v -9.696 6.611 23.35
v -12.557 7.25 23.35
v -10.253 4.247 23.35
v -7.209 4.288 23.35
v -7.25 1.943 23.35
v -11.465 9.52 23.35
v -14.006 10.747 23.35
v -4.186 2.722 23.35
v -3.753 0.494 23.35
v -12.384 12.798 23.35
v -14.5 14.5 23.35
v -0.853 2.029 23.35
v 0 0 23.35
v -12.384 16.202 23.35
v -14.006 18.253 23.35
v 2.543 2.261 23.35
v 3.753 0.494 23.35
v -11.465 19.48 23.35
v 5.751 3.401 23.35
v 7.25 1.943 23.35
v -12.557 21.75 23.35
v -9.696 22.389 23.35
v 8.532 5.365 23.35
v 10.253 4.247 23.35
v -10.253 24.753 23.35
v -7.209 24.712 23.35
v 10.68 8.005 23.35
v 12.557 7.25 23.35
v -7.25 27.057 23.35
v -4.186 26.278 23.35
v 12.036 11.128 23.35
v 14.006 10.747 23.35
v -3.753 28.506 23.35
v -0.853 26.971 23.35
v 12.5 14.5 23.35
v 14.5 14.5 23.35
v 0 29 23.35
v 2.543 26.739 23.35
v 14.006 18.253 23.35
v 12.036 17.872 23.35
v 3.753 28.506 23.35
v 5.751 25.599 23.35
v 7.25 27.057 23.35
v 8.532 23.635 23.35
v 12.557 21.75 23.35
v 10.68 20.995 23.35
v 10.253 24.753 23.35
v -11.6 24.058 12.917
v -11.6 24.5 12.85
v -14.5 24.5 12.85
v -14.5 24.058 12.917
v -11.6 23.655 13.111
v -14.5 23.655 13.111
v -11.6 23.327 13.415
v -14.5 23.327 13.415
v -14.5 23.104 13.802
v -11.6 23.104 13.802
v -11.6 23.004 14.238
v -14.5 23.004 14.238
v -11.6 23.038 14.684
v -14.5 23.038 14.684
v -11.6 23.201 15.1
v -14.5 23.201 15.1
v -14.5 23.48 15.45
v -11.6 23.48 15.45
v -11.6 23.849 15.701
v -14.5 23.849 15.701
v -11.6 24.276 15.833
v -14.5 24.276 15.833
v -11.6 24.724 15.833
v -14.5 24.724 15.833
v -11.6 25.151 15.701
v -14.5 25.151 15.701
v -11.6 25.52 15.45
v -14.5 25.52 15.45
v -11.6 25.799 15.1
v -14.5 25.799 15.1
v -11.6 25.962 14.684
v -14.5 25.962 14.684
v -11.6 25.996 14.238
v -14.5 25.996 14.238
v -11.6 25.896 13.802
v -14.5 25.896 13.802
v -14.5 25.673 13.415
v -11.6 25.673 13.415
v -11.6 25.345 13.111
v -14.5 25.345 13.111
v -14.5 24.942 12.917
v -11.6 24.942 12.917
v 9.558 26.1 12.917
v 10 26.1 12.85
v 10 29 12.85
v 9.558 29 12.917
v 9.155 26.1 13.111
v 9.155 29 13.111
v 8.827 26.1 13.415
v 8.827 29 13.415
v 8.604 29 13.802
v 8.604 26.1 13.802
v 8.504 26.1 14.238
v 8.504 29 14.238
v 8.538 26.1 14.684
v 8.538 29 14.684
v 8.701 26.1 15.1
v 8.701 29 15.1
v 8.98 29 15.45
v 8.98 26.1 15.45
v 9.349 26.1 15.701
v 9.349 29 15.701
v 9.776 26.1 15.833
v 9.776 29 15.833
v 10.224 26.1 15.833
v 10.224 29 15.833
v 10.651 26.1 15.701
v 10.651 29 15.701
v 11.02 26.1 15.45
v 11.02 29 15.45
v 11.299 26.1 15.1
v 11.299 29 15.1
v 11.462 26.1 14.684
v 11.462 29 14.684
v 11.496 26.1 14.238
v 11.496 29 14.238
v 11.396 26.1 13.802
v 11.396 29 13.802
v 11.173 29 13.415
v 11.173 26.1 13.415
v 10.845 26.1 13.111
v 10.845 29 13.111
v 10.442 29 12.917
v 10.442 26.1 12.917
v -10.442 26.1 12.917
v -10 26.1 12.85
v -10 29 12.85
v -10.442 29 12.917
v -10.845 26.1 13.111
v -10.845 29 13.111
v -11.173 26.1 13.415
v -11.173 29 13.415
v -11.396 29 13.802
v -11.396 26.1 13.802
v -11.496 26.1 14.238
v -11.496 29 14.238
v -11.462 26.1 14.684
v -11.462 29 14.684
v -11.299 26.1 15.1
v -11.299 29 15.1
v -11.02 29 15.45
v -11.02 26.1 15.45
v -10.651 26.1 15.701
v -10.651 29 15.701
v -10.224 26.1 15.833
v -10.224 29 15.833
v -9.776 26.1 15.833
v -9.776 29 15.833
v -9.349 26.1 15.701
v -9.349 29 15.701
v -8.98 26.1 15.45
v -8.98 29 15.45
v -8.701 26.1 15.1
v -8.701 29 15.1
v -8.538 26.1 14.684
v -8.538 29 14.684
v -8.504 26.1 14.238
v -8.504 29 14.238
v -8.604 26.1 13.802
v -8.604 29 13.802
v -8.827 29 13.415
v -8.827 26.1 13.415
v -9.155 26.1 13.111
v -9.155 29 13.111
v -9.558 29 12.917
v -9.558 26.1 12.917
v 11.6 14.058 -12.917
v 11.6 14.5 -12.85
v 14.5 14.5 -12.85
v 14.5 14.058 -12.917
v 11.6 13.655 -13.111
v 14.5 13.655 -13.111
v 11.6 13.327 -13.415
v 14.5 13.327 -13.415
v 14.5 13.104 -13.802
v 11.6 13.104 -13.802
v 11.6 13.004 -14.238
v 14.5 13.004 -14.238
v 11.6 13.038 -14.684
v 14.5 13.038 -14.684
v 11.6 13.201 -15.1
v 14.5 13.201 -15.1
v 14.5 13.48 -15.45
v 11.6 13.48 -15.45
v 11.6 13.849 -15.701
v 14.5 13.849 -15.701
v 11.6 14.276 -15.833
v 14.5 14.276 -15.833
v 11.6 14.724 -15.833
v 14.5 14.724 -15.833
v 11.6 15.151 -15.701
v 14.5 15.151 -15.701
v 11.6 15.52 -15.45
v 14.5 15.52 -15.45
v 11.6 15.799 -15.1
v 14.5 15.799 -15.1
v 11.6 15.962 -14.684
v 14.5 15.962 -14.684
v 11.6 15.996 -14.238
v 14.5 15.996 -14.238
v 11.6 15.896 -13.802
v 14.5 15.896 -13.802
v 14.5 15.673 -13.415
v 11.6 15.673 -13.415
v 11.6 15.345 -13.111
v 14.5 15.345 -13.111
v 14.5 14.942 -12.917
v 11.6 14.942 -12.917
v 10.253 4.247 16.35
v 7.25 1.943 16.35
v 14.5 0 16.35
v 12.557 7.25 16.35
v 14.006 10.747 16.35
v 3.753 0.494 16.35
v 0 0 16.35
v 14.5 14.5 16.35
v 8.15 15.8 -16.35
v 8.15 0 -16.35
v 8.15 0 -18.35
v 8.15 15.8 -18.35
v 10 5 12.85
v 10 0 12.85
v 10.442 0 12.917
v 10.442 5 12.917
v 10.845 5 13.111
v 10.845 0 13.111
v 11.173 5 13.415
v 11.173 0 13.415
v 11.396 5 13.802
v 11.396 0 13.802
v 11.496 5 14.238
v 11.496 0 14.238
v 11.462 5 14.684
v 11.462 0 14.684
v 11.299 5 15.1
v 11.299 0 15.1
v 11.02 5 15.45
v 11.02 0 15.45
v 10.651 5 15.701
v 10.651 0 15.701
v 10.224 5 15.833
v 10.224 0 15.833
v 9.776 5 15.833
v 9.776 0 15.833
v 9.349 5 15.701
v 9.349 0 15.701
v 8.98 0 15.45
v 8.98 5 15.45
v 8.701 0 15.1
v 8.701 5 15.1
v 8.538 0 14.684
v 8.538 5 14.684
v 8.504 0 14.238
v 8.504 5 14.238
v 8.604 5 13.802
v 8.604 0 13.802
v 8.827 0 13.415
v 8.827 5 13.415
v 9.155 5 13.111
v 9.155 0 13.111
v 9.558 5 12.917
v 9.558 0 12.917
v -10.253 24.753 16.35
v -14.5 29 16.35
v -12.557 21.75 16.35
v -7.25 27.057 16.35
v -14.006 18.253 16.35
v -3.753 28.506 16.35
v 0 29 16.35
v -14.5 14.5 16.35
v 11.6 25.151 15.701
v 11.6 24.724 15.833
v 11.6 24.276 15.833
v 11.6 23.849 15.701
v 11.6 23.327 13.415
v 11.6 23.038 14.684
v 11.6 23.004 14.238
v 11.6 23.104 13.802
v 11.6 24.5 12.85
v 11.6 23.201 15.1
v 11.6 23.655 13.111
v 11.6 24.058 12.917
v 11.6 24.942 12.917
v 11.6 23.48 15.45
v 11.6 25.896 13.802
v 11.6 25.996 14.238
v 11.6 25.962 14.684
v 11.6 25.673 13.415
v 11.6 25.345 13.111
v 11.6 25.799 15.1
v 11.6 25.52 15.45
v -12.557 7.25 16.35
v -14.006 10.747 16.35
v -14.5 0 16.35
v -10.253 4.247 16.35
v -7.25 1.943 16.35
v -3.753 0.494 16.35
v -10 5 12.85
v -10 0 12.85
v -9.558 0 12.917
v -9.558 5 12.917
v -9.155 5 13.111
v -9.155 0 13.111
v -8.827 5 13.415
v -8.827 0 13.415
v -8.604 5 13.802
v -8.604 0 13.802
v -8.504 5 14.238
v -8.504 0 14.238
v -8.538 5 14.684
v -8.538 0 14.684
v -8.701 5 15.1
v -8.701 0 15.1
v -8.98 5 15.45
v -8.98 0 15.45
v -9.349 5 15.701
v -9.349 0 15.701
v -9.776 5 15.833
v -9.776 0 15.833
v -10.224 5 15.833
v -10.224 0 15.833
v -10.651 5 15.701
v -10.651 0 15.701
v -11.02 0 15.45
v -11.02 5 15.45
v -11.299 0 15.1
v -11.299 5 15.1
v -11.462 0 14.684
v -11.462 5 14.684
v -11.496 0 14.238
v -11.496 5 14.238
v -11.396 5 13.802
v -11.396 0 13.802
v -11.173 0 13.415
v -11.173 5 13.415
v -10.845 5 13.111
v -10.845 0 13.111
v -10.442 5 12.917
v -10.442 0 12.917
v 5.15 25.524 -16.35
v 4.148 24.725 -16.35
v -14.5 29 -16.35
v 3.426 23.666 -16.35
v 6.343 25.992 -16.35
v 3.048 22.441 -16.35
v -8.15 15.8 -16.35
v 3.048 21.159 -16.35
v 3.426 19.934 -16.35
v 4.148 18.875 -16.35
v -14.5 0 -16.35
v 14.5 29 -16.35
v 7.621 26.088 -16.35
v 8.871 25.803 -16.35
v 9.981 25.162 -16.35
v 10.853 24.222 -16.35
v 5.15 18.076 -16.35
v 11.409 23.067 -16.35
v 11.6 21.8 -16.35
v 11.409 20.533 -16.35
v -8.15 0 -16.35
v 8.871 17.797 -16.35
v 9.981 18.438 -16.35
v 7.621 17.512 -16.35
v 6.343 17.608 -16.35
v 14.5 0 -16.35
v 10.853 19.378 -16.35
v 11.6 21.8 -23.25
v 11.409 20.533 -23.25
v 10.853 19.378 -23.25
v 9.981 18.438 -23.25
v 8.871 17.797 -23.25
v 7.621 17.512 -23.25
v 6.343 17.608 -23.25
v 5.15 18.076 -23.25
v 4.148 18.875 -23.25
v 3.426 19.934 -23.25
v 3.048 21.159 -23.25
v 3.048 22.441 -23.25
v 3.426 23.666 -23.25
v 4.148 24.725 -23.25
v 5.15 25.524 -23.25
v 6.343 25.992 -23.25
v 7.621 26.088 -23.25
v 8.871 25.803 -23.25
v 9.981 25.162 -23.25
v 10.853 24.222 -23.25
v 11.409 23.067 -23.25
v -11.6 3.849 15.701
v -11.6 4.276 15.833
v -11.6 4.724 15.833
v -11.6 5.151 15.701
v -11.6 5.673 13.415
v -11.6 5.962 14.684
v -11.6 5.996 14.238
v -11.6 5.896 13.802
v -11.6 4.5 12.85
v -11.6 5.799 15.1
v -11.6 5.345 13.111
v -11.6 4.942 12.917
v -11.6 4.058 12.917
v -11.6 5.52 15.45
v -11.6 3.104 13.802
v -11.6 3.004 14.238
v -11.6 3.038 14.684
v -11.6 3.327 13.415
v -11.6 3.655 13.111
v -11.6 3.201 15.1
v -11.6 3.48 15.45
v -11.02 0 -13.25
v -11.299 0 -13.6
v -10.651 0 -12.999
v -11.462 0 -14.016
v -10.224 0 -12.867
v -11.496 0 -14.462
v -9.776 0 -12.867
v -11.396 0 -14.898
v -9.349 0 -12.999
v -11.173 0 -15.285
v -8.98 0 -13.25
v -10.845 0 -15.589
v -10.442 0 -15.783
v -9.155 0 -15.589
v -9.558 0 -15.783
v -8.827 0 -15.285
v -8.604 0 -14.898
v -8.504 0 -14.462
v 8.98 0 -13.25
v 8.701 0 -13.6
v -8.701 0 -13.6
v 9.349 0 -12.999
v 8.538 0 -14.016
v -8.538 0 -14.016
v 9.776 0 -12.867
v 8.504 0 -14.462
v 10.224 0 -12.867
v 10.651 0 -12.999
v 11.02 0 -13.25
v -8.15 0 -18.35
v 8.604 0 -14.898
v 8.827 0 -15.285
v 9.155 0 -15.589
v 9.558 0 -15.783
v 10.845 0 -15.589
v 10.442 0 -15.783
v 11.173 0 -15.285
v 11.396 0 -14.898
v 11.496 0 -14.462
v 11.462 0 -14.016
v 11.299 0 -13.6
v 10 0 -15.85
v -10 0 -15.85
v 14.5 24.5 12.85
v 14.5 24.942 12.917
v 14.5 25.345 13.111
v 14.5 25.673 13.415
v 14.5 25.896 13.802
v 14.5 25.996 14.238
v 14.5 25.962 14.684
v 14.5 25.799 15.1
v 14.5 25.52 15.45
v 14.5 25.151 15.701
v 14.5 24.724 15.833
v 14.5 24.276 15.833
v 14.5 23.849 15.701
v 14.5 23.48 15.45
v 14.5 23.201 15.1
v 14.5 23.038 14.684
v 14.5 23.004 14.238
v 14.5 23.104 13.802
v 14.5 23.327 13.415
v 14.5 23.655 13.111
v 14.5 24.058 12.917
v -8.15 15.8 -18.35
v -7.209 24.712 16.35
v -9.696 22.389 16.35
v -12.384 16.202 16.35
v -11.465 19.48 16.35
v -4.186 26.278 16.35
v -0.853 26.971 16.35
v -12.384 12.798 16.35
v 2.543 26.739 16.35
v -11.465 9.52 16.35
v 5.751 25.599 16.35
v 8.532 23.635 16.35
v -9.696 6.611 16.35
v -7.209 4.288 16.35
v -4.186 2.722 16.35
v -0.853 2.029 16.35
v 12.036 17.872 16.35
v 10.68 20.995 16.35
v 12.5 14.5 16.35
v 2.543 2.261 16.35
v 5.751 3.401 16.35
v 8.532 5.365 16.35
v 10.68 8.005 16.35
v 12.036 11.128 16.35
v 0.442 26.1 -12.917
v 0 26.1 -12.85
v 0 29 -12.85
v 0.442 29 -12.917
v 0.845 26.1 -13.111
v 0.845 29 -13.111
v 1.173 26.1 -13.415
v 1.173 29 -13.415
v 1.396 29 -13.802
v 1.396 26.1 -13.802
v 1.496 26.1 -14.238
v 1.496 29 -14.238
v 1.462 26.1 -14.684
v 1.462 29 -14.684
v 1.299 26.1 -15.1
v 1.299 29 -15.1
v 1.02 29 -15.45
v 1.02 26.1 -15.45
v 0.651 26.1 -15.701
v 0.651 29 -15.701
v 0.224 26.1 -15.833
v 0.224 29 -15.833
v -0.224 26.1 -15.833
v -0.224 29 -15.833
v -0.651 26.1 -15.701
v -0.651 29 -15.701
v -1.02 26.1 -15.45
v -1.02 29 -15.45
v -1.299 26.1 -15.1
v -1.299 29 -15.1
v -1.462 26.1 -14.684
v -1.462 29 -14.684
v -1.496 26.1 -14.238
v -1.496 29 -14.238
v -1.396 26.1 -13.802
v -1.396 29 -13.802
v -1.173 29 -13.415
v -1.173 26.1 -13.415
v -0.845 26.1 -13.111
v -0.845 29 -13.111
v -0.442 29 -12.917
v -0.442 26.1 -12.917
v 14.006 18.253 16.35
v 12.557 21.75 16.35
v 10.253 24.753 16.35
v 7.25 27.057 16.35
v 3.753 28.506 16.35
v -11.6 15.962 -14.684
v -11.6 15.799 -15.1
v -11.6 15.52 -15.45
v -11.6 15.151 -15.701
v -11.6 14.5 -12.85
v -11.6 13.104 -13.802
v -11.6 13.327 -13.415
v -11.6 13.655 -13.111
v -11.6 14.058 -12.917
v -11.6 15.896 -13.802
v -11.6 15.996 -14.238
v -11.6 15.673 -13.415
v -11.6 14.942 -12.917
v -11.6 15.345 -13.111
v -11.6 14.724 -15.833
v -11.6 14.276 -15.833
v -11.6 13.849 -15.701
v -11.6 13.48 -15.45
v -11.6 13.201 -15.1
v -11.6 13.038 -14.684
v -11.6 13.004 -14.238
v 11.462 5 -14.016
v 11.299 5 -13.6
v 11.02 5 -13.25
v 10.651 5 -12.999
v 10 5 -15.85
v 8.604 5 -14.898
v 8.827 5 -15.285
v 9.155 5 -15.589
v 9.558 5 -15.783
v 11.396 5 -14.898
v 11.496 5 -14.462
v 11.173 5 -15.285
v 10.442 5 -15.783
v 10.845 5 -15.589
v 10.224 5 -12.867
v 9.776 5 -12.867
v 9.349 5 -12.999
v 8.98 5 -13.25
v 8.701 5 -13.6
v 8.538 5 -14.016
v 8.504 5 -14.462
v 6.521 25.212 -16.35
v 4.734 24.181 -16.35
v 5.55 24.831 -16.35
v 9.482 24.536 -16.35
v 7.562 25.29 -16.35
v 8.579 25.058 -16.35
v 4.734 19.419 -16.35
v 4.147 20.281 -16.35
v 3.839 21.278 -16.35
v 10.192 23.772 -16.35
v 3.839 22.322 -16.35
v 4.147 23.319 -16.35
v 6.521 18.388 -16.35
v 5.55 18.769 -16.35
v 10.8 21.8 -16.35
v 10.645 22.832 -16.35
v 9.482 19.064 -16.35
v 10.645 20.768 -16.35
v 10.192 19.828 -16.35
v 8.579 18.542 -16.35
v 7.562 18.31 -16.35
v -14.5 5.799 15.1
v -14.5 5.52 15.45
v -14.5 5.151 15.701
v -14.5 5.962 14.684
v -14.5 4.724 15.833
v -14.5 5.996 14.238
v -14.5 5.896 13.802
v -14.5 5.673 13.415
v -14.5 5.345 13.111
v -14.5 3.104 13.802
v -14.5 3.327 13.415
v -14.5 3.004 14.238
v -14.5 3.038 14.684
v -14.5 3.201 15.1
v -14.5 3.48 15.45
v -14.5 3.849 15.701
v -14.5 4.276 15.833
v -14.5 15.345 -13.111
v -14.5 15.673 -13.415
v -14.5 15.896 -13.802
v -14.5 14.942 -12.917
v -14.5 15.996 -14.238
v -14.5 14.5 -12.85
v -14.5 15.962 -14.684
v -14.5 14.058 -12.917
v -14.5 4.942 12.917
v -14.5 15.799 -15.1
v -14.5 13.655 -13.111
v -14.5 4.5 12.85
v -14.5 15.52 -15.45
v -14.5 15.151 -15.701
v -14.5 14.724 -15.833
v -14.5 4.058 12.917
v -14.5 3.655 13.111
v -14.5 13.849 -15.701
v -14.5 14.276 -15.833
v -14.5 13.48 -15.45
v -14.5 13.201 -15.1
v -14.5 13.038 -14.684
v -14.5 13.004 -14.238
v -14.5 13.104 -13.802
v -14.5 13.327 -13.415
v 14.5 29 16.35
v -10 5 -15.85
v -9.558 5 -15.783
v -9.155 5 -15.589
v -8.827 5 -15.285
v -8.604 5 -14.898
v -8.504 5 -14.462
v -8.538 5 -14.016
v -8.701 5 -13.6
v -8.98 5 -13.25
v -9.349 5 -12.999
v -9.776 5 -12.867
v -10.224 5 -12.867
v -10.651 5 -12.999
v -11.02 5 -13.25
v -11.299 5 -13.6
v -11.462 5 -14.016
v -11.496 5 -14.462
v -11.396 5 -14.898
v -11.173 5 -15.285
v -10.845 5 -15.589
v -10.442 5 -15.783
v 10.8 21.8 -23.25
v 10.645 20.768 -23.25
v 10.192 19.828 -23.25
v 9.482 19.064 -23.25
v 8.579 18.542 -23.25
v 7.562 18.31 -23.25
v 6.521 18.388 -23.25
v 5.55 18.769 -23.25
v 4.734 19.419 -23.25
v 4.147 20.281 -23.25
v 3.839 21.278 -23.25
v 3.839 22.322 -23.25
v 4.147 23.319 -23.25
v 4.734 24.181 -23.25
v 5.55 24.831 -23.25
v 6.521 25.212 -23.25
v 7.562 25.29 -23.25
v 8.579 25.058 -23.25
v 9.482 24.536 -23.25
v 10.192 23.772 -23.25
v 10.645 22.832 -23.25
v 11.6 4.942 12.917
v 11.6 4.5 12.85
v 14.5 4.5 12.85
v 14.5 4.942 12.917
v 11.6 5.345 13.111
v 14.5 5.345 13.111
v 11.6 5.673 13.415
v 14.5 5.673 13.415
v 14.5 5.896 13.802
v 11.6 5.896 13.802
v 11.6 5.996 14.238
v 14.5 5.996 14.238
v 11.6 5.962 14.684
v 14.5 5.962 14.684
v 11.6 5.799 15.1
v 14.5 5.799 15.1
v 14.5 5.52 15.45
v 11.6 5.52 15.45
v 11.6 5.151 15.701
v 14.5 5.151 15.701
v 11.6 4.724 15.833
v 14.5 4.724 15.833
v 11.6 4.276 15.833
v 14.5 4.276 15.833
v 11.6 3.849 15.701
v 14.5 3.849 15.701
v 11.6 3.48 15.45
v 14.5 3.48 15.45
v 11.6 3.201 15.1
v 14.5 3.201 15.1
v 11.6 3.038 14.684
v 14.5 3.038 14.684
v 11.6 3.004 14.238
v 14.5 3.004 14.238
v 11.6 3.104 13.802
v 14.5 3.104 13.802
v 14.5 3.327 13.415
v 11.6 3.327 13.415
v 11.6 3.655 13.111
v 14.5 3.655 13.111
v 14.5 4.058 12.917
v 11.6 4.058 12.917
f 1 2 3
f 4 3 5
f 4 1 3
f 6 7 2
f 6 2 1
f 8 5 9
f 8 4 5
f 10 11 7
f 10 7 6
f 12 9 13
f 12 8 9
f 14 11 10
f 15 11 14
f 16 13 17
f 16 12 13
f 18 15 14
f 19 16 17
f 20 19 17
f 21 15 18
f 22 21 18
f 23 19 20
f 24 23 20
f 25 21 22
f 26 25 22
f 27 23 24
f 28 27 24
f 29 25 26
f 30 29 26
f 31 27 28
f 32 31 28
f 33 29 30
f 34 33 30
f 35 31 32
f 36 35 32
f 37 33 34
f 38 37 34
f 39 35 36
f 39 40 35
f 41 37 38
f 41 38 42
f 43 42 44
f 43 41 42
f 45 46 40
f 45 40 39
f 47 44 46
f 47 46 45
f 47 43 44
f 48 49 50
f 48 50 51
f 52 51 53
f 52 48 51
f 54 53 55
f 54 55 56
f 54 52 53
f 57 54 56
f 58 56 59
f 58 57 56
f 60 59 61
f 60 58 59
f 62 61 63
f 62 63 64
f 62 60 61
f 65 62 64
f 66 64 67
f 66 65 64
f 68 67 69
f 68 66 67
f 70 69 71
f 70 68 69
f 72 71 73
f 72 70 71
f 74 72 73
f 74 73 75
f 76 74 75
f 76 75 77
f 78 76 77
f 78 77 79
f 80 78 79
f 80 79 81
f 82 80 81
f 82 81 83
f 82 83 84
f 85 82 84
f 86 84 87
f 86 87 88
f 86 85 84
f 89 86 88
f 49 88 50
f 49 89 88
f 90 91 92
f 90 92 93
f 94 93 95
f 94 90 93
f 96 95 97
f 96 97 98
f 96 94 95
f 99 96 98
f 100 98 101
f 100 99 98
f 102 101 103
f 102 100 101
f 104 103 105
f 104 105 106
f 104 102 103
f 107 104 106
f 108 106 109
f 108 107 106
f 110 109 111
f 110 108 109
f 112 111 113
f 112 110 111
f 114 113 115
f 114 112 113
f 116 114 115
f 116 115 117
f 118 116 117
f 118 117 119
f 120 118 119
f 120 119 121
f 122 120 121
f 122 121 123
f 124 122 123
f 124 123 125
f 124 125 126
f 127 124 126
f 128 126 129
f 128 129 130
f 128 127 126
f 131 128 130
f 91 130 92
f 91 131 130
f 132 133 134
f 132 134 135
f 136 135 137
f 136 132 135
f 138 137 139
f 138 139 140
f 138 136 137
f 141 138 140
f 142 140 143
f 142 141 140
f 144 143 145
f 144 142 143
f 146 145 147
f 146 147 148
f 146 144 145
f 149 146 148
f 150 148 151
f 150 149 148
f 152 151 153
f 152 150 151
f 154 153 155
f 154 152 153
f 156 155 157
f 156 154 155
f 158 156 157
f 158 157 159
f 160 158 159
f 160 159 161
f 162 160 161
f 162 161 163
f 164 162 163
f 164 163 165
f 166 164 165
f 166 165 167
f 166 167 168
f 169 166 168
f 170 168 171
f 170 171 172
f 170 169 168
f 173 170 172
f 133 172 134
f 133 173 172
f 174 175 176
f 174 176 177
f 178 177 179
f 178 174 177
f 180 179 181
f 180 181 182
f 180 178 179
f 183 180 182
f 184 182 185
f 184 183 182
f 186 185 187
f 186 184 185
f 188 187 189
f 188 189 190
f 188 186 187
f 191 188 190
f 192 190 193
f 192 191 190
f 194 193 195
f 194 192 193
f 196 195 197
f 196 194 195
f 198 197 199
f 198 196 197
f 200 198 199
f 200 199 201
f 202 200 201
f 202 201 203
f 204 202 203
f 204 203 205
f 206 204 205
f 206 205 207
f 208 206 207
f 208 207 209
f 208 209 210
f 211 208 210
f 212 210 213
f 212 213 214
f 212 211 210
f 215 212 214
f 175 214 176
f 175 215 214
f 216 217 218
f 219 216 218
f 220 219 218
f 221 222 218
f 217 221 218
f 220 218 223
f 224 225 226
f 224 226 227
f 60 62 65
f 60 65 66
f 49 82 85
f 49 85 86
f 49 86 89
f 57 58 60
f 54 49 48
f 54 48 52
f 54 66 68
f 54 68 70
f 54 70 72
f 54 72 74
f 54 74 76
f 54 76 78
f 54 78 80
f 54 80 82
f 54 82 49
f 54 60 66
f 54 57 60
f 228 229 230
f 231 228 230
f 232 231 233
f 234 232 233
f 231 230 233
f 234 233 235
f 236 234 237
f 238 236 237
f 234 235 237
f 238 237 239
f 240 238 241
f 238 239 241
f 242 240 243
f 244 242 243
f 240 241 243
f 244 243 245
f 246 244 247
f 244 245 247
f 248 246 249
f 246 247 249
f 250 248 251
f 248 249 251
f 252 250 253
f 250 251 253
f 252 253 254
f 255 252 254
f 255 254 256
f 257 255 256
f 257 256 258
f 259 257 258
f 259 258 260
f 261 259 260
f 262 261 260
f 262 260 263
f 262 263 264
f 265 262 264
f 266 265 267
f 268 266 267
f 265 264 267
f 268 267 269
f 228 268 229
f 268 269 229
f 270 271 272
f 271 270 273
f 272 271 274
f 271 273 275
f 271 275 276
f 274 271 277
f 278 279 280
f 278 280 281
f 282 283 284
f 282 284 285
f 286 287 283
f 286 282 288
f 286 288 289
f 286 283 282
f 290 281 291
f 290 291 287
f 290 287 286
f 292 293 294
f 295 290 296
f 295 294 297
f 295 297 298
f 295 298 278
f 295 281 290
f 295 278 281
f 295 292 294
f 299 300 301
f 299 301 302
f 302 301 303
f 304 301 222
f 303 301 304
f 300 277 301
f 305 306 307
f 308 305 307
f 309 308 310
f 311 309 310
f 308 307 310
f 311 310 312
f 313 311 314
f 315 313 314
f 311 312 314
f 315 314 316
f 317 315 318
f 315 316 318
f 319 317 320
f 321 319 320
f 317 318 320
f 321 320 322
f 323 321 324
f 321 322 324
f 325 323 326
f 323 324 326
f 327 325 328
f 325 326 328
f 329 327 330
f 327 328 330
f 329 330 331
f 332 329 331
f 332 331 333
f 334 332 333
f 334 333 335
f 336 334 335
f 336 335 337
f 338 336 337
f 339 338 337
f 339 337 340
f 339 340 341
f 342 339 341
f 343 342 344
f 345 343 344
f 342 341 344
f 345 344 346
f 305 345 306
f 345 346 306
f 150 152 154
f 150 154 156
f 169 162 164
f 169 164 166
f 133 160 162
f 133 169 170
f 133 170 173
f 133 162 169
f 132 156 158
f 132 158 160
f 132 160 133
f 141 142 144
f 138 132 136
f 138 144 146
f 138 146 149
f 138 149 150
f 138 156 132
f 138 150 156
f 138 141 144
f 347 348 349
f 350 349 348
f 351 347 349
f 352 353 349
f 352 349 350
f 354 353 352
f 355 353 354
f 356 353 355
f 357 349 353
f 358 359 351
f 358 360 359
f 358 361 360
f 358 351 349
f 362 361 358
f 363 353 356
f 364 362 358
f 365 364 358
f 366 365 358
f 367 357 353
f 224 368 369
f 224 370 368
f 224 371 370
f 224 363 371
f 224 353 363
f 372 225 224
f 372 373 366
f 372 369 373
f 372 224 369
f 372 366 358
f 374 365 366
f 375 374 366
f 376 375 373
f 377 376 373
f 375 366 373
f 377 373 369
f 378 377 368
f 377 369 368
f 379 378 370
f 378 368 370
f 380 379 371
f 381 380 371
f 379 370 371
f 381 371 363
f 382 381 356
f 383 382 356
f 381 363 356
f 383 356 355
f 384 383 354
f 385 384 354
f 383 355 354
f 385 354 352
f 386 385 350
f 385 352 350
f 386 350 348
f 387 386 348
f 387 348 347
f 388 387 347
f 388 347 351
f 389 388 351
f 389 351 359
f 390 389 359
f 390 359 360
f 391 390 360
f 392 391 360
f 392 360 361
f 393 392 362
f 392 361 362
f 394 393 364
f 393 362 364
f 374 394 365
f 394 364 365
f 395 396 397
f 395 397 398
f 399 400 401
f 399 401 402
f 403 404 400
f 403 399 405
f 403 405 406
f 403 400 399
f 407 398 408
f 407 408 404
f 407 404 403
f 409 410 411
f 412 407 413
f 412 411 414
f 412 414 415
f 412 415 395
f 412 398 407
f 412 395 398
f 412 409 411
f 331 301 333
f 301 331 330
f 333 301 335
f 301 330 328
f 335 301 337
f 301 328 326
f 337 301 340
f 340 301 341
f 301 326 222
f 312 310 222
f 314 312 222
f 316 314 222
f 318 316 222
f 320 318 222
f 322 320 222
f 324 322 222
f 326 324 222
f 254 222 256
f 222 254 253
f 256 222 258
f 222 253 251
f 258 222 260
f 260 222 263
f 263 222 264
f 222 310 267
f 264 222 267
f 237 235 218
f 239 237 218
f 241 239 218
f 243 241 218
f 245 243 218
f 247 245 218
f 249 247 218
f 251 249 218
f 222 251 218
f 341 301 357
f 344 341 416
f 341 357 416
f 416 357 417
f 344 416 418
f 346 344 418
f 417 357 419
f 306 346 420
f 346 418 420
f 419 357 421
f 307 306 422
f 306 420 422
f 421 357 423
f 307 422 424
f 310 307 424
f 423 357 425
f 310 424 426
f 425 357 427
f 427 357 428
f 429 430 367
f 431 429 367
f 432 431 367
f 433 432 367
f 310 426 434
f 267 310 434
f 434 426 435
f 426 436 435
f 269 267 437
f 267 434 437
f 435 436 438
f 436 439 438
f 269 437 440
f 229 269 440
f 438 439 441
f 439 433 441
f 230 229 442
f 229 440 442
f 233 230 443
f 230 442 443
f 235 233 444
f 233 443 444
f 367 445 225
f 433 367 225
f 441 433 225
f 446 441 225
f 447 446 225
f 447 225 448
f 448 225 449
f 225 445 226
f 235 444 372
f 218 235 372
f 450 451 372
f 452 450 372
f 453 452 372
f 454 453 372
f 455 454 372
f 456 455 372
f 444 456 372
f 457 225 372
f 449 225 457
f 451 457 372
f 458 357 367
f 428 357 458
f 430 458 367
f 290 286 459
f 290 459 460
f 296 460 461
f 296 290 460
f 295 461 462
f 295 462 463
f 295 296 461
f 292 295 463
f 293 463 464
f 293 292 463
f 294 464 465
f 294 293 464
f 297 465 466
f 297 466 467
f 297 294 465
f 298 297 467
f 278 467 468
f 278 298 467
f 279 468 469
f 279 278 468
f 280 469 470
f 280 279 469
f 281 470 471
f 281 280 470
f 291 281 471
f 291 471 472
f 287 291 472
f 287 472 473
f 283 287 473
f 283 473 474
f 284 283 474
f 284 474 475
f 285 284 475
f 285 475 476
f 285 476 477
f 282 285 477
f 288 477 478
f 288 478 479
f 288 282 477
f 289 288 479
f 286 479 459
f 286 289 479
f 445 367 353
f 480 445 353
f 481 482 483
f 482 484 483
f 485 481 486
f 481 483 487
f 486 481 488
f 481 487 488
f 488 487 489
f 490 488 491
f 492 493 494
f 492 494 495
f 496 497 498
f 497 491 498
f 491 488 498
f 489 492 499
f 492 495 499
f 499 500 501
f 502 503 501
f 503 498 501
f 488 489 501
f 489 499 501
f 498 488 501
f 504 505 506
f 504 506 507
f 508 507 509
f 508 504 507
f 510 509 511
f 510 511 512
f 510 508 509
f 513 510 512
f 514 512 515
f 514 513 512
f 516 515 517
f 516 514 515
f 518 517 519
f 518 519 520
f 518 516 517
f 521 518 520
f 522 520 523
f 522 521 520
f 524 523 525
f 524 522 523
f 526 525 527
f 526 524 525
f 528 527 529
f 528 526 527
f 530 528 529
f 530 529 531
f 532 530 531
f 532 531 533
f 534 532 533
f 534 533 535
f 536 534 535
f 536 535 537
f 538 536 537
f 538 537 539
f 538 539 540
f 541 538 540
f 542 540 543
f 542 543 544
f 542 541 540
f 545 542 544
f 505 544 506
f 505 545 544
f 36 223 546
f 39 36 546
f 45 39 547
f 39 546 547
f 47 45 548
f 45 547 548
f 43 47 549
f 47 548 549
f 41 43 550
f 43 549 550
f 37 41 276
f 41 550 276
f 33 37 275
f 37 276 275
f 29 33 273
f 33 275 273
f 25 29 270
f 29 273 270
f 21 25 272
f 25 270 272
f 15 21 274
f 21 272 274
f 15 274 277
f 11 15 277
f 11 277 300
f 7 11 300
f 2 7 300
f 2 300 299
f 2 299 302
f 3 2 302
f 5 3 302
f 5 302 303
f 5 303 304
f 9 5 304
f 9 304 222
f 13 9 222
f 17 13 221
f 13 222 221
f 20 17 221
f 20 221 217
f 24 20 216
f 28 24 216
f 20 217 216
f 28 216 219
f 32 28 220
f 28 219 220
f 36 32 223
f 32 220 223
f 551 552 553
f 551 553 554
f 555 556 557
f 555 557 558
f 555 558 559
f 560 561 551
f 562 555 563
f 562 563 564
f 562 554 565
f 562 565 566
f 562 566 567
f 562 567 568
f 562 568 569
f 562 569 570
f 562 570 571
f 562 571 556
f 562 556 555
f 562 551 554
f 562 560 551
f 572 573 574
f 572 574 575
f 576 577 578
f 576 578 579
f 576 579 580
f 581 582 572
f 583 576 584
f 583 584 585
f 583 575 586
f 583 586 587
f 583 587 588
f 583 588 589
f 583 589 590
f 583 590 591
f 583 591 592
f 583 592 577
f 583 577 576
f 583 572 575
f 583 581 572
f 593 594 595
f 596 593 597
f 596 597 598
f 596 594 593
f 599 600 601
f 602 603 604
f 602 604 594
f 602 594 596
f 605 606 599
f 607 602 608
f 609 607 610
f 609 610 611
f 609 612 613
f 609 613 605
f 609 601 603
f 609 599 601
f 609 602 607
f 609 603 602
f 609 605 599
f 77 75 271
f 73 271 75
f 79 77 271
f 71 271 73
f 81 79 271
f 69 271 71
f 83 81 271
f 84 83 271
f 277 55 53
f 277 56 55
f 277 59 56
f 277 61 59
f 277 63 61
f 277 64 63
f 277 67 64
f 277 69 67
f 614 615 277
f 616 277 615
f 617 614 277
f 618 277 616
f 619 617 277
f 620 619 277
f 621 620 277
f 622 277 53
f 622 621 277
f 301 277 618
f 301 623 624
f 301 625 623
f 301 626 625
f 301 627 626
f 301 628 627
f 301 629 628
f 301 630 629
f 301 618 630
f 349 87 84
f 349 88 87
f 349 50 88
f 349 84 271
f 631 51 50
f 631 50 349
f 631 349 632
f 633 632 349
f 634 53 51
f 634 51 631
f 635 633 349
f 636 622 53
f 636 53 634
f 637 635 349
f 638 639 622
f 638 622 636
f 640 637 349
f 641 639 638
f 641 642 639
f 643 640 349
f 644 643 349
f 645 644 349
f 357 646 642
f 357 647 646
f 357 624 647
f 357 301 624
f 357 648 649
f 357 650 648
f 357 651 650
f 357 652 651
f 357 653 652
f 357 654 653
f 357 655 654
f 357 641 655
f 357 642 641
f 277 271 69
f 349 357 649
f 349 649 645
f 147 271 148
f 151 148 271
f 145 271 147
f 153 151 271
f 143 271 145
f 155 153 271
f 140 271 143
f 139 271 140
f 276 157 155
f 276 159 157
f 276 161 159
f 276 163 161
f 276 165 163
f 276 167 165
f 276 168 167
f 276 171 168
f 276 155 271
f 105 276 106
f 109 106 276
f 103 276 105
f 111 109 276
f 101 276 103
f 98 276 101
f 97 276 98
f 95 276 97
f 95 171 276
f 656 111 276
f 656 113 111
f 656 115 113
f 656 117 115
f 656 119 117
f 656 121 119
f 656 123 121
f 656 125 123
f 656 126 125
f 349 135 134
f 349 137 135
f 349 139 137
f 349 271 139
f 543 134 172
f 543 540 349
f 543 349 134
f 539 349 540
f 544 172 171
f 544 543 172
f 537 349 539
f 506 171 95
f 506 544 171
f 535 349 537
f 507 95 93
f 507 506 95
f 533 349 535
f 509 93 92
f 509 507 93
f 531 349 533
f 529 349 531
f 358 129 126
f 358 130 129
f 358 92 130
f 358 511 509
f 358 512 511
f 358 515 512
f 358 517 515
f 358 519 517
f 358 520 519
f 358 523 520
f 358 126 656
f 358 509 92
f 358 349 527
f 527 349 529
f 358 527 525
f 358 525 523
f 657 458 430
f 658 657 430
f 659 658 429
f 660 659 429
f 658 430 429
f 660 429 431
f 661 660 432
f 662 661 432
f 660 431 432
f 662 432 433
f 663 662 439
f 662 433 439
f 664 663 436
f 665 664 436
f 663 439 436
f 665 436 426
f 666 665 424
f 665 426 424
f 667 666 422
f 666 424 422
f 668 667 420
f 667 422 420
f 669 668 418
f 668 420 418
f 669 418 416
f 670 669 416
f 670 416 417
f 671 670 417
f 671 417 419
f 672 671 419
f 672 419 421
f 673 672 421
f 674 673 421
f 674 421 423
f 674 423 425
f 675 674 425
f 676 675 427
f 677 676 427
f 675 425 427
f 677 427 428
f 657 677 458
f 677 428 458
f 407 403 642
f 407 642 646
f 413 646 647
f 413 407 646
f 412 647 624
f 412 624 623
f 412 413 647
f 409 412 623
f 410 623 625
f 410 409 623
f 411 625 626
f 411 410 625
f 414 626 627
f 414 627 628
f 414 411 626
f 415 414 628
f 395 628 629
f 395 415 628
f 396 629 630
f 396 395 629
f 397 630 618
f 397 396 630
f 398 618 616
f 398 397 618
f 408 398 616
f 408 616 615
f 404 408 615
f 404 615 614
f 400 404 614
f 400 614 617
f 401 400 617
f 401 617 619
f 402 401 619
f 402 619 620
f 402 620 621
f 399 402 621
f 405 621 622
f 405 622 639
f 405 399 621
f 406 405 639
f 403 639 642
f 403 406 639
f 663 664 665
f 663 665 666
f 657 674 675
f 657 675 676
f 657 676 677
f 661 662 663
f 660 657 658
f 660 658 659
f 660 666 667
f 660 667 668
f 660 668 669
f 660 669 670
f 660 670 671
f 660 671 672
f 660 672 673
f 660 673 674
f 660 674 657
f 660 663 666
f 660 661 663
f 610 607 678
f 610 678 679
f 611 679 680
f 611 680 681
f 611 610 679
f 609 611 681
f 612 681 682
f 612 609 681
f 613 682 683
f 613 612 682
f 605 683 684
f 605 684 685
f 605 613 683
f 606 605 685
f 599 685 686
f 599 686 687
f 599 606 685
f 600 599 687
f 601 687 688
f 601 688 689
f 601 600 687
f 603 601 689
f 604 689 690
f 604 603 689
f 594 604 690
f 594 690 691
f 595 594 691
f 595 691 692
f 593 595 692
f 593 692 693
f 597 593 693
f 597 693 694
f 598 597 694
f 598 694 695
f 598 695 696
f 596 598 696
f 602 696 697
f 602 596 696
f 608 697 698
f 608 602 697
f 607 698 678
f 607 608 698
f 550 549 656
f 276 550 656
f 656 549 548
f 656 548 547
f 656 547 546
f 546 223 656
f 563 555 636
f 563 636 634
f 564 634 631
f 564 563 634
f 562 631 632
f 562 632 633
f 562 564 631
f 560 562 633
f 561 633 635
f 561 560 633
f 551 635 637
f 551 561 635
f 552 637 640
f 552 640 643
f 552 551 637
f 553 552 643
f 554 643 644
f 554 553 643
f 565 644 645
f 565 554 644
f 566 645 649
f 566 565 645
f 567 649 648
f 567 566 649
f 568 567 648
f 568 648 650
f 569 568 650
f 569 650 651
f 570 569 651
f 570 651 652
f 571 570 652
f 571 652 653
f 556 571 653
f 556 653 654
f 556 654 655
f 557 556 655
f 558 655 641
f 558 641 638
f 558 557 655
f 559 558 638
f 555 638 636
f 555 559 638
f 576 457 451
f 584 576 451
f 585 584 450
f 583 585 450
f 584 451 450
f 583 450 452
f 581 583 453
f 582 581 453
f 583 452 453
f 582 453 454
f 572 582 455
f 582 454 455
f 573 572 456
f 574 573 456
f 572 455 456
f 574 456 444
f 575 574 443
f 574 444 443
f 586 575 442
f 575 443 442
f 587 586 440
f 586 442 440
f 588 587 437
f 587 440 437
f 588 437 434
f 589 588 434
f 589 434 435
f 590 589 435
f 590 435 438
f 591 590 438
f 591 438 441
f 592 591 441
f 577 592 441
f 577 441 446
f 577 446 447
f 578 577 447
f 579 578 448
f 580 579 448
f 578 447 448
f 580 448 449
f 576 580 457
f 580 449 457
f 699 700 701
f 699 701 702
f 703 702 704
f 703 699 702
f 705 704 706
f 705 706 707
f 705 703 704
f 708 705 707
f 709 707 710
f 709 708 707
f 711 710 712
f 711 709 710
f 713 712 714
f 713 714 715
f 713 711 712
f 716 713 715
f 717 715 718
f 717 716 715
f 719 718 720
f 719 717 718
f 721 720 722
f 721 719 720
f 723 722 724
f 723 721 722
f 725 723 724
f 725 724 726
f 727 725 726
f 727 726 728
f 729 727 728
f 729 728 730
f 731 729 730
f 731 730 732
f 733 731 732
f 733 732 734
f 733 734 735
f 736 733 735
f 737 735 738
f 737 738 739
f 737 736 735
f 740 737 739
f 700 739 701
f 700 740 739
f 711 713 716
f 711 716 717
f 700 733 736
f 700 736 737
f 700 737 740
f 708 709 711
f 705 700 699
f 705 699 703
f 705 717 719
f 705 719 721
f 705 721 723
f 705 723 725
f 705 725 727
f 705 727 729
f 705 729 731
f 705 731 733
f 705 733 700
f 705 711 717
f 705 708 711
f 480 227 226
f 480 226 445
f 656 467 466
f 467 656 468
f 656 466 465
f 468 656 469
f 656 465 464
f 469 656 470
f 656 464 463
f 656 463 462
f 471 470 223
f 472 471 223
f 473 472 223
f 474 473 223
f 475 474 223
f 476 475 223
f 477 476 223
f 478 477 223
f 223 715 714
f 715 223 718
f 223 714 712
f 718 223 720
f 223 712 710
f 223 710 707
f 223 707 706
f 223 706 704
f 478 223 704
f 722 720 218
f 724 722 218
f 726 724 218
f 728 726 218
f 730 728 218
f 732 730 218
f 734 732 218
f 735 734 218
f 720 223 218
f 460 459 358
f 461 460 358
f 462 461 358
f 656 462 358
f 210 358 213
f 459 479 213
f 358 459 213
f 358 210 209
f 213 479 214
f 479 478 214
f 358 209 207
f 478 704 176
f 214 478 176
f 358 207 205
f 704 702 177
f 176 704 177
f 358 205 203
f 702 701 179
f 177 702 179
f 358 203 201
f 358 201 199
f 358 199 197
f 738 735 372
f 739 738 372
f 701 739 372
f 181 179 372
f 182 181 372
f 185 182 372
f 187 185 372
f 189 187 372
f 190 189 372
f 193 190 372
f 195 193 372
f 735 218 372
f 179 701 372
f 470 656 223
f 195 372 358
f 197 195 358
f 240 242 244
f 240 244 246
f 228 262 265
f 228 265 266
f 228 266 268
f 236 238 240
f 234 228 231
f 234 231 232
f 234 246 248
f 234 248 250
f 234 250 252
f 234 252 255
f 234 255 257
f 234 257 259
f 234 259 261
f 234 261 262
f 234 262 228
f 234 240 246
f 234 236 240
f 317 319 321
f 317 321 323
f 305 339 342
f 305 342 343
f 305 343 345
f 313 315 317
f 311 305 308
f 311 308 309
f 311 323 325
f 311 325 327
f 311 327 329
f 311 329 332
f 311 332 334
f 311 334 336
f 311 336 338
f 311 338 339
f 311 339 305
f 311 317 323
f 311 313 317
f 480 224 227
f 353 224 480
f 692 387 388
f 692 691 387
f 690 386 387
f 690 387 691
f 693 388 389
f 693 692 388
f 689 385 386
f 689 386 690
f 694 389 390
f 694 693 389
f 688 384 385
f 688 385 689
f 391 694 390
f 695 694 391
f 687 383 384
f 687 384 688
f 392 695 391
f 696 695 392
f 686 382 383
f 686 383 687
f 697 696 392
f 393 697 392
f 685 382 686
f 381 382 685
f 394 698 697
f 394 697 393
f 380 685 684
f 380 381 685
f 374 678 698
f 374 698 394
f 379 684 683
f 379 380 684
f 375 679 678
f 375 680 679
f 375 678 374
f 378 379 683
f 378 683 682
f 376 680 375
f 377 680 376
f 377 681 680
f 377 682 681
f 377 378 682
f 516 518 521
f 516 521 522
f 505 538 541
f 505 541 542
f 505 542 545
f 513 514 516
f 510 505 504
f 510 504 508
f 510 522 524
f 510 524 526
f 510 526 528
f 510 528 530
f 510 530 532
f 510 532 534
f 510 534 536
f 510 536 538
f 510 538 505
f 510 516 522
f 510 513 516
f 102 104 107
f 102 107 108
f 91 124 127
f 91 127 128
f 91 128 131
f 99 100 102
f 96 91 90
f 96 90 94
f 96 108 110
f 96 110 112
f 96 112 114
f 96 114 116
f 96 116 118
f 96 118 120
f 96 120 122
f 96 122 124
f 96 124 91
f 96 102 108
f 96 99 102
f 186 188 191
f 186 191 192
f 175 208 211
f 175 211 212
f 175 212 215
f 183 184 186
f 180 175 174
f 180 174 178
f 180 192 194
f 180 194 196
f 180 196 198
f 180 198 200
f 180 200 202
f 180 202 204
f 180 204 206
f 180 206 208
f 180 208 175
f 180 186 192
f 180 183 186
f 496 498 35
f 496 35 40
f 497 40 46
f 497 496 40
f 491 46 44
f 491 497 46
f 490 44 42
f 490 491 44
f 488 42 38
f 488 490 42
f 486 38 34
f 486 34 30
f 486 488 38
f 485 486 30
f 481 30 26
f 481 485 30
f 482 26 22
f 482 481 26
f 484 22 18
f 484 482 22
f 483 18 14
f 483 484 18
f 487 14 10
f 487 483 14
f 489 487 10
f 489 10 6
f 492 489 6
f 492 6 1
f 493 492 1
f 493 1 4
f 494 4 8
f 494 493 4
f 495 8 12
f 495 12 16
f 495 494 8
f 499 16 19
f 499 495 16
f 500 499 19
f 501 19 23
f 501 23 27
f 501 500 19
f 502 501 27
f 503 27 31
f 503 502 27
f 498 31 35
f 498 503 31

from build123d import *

# Parameters (mm, degrees)
SKETCH_1_W               = 29
SKETCH_1_H               = 32.7
EXTRUDE_1_DEPTH          = 29
SKETCH_2_R               = 14.5
SKETCH_2_R_2             = 12.5
EXTRUDE_2_DEPTH          = 7
SKETCH_3_R               = 1.5
CUT_EXTRUDE_1_DEPTH      = 5
CUT_EXTRUDE_START        = -2.9
SKETCH_4_R               = 1.5
CUT_EXTRUDE_2_DEPTH      = 2.9
SKETCH_5_R               = 4.3
SKETCH_5_R_2             = 3.5
EXTRUDE_3_DEPTH          = 6.9
SKETCH_6_W               = 16.3
SKETCH_6_H               = 15.8
EXTRUDE_4_DEPTH          = 2
PATTERN_CIRCULAR_1_COUNT = 4


with BuildPart() as part:
    # 草图1 → 凸台-拉伸1 (new body)
    with BuildSketch(Plane(origin=(0, 0, 0), x_dir=(1, 0, 0), z_dir=(0, 1, 0))):
        Rectangle(SKETCH_1_W, SKETCH_1_H)
    extrude(amount=EXTRUDE_1_DEPTH)

    # 草图2 → 凸台-拉伸2 (add)
    with BuildSketch(Plane.XY.offset(16.35)):
        with Locations((0, 14.5)):
            Circle(SKETCH_2_R)
        with Locations((0, 14.5)):
            Circle(SKETCH_2_R_2, mode=Mode.SUBTRACT)
    extrude(amount=EXTRUDE_2_DEPTH)

    # 草图3 → 切除-拉伸1 (cut)
    with BuildSketch(Plane.XZ):
        with Locations(Location((-10, 14.35, 0), (0, 0, 270))):
            Circle(SKETCH_3_R)
        with Locations(Location((10, 14.35, 0), (0, 0, 270))):
            Circle(SKETCH_3_R)
        with Locations(Location((-10, -14.35, 0), (0, 0, 270))):
            Circle(SKETCH_3_R)
        with Locations(Location((10, -14.35, 0), (0, 0, 270))):
            Circle(SKETCH_3_R)
    extrude(amount=-CUT_EXTRUDE_1_DEPTH, mode=Mode.SUBTRACT)

    # 草图4 → 切除-拉伸2 (cut)
    with BuildSketch(Plane(origin=(0, 29, 0), x_dir=(1, 0, 0), z_dir=(0, 1, 0)).offset(CUT_EXTRUDE_START)):
        with Locations(Location((0, 14.35, 0), (0, 0, 270))):
            Circle(SKETCH_4_R)
        with Locations(Location((-10, -14.35, 0), (0, 0, 90))):
            Circle(SKETCH_4_R)
        with Locations(Location((10, -14.35, 0), (0, 0, 90))):
            Circle(SKETCH_4_R)
    cut_extrude_2 = extrude(amount=CUT_EXTRUDE_2_DEPTH, mode=Mode.SUBTRACT)

    # 草图5 → 凸台-拉伸3 (add)
    with BuildSketch(Plane(origin=(0, 0, -16.35), x_dir=(-1, 0, 0), z_dir=(0, 0, -1))):
        with Locations(Location((-7.3, 21.8, 0), (0, 0, 180))):
            Circle(SKETCH_5_R)
        with Locations(Location((-7.3, 21.8, 0), (0, 0, 180))):
            Circle(SKETCH_5_R_2, mode=Mode.SUBTRACT)
    extrude(amount=EXTRUDE_3_DEPTH)

    # 草图6 → 凸台-拉伸4 (add)
    with BuildSketch(Plane(origin=(0, 0, -16.35), x_dir=(-1, 0, 0), z_dir=(0, 0, -1))):
        with Locations((0, 7.9)):
            Rectangle(SKETCH_6_W, SKETCH_6_H)
    extrude(amount=EXTRUDE_4_DEPTH)

    # 阵列(圆周)1: 切除-拉伸2 ×4 about axis, 1 skipped
    pattern_circular_1_axis = Axis((0, 14.5, 0), (0, 0, -1))
    add([cut_extrude_2.rotate(pattern_circular_1_axis, i * 360 / PATTERN_CIRCULAR_1_COUNT) for i in range(1, PATTERN_CIRCULAR_1_COUNT) if i not in (2,)], mode=Mode.SUBTRACT)


solid = part.part
